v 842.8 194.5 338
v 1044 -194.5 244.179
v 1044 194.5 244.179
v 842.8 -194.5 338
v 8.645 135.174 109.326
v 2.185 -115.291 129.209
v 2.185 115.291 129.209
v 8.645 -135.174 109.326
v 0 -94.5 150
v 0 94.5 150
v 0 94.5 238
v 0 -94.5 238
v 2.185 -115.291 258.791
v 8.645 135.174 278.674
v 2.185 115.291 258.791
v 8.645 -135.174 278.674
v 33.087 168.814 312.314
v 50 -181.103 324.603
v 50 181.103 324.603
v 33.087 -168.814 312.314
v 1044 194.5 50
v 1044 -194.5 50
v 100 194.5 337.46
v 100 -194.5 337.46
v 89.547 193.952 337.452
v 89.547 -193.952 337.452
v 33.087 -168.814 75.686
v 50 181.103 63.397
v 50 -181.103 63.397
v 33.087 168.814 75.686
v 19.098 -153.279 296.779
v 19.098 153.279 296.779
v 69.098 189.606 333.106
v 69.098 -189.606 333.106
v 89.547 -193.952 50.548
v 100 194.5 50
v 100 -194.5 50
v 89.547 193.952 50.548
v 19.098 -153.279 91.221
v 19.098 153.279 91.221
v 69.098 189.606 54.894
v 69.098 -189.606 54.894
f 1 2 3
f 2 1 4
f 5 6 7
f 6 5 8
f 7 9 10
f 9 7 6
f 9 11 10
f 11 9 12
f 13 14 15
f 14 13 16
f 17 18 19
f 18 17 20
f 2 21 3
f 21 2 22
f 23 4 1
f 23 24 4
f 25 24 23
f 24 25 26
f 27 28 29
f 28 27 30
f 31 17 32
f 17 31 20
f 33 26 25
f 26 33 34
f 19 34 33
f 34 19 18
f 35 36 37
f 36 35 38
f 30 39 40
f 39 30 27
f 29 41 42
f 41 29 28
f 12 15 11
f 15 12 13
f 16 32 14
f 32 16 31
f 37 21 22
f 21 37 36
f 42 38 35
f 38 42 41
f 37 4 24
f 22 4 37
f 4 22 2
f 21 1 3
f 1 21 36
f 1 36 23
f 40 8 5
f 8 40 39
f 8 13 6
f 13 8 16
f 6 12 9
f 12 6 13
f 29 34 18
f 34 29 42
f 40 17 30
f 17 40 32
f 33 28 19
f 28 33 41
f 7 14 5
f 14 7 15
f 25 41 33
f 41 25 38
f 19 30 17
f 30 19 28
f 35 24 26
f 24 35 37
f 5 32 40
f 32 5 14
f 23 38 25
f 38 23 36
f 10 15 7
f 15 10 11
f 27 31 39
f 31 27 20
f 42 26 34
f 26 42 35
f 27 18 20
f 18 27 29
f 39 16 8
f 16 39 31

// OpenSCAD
// Ahmed et al. (1984) body in millimetres. x runs from the nose to the tail,
// y is centred on the symmetry plane and the underside sits `lift` above z = 0,
// the floor the stilts stand on. The rear slant length is measured along the slant.
// Resolution comes from the command line: openscad -D '$fn=96'.

module ahmed_body(slant_deg = 25, lift = 50) {
    length = 1044;
    width = 389;
    height = 288;
    slant_length = 222;
    front_radius = 100;
    slant_dx = slant_length * cos(slant_deg);
    slant_dz = slant_length * sin(slant_deg);

    translate([0, 0, lift])
        intersection() {
            // Side view: round the top and bottom front edges and cut the rear slant.
            rotate([90, 0, 0])
                linear_extrude(height = width, center = true)
                    hull() {
                        for (z = [front_radius, height - front_radius])
                            translate([front_radius, z])
                                circle(r = front_radius);
                        polygon([
                            [front_radius, 0],
                            [length, 0],
                            [length, height - slant_dz],
                            [length - slant_dx, height],
                            [front_radius, height - front_radius]
                        ]);
                    }
            // Plan view: round the two vertical front edges.
            linear_extrude(height = height)
                hull() {
                    for (side = [-1, 1])
                        translate([front_radius, side * (width / 2 - front_radius)])
                            circle(r = front_radius);
                    translate([front_radius, -width / 2])
                        square([length - front_radius, width]);
                }
        }
}

ahmed_body();
